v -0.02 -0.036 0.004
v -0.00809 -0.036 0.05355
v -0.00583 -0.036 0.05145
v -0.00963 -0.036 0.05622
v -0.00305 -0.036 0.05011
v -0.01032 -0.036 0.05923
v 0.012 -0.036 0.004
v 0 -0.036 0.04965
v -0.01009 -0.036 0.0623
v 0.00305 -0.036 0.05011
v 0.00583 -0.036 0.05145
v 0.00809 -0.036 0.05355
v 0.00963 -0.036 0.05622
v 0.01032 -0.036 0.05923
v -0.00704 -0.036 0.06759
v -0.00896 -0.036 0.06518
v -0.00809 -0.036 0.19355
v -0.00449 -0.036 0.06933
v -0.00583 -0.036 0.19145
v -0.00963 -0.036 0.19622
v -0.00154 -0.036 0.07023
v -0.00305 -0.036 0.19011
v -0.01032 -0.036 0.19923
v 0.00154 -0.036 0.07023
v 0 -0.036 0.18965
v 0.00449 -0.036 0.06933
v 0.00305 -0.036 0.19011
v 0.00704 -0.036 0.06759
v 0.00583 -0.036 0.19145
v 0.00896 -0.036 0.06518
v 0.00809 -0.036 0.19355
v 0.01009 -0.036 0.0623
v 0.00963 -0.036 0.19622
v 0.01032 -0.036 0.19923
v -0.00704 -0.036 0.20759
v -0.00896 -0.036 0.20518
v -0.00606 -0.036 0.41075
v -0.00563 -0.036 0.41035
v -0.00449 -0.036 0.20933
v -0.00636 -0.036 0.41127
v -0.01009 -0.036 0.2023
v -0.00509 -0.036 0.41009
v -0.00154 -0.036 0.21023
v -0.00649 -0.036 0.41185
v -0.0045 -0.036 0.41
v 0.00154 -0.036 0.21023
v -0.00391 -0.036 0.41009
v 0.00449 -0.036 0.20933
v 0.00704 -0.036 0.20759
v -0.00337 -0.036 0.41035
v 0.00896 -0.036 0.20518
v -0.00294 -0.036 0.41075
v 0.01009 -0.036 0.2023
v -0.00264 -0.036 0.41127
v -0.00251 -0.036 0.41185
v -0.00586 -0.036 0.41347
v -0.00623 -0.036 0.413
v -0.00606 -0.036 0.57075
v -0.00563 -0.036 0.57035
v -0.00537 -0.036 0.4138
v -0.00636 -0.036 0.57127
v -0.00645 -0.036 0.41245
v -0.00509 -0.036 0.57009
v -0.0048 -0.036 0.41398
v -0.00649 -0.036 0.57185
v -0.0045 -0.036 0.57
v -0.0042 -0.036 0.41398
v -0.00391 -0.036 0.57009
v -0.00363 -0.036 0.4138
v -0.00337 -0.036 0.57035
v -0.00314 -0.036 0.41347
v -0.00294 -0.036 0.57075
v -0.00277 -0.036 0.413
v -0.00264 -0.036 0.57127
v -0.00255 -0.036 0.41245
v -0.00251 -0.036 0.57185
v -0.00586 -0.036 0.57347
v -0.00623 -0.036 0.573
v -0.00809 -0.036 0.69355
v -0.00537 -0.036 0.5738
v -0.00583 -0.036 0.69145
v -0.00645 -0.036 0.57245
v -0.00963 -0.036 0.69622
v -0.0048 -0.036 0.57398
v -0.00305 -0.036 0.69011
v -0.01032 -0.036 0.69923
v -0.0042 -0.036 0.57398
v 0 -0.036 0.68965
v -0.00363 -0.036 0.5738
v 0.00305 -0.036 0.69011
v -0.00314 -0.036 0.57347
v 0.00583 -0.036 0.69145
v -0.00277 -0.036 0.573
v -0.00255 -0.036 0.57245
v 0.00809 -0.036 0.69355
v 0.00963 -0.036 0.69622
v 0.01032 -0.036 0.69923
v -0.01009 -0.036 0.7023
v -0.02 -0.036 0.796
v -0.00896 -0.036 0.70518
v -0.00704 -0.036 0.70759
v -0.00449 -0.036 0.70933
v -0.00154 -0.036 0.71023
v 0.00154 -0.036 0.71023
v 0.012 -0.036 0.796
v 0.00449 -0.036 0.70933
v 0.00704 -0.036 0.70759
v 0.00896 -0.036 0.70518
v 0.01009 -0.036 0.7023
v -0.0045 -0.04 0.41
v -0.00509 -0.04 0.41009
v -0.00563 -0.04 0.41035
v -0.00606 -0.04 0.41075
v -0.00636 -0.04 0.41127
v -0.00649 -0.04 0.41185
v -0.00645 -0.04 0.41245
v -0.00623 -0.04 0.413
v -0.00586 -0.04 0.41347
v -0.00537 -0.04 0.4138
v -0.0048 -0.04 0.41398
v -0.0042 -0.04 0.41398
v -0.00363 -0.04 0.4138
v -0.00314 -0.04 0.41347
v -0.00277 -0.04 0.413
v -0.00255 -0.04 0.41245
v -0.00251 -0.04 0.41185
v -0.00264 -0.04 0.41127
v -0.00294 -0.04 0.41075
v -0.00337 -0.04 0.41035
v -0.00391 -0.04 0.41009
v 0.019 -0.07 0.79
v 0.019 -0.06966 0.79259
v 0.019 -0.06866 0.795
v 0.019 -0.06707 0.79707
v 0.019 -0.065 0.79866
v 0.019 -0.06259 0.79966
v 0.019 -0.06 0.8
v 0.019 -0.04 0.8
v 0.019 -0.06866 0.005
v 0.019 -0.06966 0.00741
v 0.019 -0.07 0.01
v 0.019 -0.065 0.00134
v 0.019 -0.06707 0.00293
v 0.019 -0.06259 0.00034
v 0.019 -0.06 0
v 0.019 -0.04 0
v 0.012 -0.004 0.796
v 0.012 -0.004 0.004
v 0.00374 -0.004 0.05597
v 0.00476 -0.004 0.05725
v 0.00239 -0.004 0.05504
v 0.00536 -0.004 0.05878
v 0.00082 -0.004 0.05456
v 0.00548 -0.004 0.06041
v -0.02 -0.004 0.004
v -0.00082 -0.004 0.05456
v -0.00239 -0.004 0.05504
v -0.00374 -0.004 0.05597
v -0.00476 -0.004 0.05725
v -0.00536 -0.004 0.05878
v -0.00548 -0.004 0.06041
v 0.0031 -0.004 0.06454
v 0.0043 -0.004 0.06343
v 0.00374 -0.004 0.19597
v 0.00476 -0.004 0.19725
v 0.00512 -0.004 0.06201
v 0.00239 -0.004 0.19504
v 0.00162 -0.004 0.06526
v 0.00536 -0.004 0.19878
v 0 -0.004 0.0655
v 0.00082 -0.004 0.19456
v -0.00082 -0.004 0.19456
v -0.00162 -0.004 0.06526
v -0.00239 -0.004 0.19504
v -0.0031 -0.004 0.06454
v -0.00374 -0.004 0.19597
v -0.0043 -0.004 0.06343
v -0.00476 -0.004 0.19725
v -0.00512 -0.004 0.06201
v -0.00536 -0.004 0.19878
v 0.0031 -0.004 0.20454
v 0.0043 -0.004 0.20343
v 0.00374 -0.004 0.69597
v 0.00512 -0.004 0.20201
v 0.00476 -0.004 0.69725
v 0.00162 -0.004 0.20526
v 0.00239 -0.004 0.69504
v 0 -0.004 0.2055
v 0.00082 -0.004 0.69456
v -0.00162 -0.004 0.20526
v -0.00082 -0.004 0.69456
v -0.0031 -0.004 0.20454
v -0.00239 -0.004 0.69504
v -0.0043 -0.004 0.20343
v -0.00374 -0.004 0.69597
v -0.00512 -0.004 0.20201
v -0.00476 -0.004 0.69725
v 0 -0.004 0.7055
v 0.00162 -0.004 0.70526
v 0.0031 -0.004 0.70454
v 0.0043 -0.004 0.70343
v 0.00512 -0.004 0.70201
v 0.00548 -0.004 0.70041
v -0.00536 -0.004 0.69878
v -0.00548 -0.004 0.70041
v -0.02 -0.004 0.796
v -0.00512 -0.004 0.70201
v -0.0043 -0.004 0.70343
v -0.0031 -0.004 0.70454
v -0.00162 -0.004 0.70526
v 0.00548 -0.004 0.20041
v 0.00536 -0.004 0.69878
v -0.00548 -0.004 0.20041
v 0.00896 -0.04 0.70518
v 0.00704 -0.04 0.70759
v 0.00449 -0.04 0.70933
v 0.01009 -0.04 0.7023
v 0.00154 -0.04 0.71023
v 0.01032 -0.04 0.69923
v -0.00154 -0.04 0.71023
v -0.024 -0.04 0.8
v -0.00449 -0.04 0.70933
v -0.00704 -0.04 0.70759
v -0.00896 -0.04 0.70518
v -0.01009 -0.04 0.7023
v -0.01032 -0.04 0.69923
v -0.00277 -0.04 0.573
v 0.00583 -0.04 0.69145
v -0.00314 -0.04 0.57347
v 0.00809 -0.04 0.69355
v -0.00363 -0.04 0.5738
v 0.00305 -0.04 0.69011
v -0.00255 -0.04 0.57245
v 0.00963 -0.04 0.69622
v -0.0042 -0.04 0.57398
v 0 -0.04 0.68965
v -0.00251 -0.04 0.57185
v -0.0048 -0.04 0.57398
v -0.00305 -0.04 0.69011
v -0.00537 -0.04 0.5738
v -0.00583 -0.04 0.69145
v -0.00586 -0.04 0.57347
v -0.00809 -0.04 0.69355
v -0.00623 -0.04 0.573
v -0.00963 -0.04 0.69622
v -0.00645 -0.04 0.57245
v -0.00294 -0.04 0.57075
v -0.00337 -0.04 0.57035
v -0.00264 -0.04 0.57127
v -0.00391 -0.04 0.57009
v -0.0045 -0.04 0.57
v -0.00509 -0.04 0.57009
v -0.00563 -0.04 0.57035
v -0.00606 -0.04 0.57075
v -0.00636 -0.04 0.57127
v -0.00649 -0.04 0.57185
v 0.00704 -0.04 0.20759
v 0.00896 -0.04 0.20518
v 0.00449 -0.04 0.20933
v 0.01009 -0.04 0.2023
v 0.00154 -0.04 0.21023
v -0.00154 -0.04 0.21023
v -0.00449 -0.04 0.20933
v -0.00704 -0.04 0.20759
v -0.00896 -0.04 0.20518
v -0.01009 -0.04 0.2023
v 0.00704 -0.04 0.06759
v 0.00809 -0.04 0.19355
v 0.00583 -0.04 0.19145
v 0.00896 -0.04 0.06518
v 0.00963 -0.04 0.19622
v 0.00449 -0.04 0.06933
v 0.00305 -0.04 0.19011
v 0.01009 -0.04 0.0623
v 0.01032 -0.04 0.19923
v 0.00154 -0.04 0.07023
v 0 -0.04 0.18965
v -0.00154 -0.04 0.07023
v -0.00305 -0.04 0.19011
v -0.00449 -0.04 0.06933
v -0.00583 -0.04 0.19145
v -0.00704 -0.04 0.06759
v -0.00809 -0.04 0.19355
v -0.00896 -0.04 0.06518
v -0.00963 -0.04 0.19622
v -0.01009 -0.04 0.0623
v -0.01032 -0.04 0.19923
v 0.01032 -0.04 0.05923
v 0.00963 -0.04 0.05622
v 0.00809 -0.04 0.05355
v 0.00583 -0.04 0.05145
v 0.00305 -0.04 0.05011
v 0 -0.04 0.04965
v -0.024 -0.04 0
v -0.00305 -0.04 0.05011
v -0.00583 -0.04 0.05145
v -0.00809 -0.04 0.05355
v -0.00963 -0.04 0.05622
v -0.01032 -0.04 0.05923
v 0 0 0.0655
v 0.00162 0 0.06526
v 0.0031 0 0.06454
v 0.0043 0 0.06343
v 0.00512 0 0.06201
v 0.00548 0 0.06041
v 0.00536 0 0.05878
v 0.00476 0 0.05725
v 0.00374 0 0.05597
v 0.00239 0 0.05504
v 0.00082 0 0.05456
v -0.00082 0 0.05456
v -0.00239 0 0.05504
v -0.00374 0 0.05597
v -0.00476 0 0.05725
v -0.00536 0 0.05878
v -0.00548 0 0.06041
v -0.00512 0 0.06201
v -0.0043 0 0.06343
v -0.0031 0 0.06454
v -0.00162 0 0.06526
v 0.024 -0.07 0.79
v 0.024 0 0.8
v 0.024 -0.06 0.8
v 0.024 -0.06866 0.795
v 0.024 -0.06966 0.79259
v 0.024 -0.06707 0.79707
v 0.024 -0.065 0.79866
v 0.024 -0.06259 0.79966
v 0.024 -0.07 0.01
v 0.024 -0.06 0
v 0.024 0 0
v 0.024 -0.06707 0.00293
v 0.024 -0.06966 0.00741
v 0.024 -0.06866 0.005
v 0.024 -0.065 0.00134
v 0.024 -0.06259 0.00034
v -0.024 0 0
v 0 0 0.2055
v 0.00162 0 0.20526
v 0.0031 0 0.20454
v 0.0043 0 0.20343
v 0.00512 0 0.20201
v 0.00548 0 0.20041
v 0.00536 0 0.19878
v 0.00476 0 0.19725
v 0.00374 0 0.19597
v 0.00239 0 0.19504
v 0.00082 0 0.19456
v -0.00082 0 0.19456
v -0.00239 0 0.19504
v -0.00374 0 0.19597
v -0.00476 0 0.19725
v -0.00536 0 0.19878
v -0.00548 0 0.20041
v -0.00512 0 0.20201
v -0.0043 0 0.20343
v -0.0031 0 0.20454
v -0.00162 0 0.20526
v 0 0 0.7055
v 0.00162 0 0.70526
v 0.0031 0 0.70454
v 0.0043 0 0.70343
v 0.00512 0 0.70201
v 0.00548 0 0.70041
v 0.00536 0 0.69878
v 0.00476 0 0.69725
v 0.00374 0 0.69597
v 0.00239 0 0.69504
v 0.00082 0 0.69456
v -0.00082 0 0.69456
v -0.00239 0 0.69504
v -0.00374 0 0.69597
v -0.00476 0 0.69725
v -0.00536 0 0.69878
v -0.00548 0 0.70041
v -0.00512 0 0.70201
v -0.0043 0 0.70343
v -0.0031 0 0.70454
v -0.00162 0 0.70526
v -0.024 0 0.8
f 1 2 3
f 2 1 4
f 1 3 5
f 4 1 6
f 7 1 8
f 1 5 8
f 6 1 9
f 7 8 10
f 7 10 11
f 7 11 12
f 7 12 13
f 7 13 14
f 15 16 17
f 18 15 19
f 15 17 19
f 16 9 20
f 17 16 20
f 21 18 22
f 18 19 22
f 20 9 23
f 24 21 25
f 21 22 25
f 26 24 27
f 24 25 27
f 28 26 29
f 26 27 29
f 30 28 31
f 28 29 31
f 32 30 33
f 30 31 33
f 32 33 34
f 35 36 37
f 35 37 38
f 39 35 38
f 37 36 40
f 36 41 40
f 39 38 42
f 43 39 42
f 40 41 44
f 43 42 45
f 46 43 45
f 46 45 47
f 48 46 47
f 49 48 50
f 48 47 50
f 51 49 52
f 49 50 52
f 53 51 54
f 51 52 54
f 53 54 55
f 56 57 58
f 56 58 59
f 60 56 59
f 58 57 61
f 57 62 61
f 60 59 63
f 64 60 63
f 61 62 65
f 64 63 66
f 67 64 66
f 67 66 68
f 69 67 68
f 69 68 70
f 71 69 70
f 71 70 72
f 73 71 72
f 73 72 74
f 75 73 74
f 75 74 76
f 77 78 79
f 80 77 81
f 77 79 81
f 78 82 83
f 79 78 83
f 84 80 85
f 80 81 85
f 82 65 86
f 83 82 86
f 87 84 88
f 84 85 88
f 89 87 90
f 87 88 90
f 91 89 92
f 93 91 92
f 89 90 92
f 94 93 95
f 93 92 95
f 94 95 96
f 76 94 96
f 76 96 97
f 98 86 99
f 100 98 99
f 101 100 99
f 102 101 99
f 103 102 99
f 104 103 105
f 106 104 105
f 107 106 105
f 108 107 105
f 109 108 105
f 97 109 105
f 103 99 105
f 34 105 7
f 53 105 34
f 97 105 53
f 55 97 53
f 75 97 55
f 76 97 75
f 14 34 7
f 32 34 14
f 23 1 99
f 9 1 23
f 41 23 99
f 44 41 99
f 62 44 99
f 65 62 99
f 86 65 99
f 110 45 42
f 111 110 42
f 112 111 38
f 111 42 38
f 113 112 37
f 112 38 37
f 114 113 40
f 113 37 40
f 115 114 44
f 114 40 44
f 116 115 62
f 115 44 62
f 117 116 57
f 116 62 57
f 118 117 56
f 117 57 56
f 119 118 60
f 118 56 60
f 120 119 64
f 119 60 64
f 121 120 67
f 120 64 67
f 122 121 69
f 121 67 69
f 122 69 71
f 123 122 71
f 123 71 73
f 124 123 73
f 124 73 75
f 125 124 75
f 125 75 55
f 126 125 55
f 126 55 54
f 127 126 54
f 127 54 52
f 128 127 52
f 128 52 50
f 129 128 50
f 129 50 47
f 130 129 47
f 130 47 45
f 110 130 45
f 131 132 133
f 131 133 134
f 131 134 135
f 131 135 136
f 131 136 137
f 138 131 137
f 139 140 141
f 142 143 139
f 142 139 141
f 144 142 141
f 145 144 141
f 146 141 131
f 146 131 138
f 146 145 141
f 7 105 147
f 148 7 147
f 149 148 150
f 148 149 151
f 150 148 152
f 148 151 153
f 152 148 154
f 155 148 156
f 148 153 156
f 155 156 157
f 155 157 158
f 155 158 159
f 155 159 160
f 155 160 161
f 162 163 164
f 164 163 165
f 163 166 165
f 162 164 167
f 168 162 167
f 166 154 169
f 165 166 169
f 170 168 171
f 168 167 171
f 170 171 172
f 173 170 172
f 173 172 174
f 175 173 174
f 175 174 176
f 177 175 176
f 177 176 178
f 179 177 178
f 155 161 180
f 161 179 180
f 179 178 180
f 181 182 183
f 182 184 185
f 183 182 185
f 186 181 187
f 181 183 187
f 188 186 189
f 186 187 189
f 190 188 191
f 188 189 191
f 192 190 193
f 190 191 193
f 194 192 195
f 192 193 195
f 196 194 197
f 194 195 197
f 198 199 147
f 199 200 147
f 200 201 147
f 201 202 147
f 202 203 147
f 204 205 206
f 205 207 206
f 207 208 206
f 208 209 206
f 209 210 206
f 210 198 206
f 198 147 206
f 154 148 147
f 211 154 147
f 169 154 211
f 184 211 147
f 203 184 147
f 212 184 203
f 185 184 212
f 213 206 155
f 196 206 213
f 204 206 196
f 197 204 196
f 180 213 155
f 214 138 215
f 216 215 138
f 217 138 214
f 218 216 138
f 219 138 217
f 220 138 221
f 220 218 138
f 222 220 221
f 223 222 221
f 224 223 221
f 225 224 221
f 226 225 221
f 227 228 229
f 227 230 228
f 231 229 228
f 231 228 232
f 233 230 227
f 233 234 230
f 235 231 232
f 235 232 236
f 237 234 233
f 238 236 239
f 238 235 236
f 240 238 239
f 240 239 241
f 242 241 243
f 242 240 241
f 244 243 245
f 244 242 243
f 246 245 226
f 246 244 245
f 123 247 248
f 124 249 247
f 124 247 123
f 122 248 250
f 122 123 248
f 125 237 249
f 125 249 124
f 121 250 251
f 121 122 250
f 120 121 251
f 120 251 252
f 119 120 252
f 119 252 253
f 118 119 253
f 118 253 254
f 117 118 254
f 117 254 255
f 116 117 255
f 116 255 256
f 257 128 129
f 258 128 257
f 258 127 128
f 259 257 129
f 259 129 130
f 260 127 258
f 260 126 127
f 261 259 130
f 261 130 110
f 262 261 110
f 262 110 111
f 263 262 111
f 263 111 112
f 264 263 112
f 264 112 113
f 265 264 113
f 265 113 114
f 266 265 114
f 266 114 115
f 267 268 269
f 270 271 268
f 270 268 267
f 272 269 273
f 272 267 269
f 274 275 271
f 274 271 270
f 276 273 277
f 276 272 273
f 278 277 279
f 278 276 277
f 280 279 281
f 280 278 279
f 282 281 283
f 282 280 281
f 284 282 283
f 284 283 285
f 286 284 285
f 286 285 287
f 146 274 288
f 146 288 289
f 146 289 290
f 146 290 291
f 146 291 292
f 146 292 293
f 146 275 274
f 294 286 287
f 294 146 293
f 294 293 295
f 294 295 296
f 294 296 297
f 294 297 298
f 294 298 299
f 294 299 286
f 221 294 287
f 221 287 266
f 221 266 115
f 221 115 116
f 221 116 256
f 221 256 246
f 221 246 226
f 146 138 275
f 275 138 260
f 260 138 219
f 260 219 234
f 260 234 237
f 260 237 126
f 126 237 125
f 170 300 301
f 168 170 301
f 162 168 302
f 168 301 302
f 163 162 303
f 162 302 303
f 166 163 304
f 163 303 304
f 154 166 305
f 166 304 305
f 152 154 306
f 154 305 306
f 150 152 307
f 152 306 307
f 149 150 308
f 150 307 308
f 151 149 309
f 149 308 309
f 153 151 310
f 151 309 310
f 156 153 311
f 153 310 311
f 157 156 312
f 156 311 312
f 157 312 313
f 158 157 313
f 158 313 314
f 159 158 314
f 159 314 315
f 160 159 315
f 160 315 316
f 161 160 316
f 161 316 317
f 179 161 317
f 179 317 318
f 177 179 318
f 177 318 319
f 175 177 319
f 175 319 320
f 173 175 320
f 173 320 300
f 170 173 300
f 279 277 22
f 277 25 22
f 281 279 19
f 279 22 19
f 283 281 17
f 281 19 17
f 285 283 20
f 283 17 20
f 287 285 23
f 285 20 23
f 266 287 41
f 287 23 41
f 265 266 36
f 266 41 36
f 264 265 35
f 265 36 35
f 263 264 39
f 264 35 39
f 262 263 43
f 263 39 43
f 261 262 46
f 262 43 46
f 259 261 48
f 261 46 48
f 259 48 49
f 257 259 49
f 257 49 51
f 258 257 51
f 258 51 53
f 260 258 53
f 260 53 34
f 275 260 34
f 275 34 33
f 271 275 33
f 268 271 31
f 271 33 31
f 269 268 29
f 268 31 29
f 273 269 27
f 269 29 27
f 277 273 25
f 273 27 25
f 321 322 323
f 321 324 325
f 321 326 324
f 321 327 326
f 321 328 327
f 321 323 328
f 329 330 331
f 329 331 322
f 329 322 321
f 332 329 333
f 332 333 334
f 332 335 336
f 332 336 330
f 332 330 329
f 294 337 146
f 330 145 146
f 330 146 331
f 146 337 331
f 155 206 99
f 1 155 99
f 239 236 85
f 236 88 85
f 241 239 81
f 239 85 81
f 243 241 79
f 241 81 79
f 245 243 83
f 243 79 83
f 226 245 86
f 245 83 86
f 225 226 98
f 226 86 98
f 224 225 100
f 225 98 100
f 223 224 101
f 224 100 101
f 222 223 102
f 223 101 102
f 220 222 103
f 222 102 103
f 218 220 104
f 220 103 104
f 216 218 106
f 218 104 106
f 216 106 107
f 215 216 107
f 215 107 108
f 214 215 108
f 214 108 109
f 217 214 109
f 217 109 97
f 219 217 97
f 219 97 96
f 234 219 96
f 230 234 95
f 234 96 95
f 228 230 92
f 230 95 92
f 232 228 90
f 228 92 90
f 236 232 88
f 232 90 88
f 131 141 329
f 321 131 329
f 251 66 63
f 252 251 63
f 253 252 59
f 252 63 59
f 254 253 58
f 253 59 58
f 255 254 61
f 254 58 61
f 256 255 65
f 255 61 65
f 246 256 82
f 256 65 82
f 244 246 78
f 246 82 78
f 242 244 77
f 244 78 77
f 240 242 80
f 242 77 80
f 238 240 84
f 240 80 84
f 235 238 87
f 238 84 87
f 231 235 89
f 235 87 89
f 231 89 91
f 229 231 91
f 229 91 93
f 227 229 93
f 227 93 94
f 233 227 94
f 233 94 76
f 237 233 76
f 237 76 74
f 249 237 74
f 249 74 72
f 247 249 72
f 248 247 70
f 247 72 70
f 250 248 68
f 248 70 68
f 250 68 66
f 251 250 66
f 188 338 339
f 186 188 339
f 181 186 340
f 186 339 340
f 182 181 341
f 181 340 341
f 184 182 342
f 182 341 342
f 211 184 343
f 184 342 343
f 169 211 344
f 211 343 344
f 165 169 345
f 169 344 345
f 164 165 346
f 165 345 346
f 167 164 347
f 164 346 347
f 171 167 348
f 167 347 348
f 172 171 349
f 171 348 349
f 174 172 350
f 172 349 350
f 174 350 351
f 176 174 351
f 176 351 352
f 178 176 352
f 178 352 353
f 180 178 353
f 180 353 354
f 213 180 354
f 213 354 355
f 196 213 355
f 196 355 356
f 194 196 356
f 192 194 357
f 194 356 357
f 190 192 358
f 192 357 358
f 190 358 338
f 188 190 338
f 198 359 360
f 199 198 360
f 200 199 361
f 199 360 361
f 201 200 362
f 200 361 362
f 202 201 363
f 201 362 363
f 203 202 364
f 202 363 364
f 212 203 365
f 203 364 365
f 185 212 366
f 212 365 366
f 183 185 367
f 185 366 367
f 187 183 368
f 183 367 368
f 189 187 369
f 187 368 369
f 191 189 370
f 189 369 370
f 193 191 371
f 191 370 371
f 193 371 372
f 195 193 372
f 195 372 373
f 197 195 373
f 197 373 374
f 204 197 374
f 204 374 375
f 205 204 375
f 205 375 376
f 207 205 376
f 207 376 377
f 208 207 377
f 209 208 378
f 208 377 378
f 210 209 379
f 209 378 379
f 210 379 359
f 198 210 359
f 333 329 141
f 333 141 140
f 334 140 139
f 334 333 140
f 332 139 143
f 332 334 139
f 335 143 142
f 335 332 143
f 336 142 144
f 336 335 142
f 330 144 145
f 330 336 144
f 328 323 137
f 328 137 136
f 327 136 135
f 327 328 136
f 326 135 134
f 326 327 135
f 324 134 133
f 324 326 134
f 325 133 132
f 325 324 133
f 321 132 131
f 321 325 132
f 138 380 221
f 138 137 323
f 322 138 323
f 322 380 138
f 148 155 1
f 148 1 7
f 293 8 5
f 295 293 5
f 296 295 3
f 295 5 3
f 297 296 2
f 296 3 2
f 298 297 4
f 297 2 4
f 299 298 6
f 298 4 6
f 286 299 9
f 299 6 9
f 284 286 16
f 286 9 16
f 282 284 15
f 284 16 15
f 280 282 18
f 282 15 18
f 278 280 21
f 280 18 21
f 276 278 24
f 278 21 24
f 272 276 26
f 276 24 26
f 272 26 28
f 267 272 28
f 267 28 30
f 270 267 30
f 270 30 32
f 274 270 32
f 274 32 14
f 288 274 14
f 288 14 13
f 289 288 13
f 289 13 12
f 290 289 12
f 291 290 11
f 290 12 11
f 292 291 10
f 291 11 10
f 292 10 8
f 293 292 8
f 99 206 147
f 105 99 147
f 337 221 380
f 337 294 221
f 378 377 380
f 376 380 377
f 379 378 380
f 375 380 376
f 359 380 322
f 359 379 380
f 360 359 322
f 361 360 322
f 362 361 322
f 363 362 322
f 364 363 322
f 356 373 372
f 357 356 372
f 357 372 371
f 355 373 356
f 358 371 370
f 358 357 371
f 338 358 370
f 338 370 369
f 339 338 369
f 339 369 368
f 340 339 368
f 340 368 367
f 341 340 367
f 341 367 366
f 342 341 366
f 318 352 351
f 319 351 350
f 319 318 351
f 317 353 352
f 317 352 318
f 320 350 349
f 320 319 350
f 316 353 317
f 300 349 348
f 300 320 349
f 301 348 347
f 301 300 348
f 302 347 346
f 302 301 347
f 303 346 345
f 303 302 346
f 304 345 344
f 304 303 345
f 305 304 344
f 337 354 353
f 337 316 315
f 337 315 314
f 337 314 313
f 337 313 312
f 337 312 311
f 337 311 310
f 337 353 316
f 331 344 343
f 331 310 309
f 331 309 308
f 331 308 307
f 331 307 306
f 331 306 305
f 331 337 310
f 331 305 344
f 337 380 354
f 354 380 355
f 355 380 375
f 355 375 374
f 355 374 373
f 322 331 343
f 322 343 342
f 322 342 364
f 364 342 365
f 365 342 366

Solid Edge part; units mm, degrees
sketch "Sketch1" plane through (0, 0, 0) normal (0, 0, 1) x (1, 0, 0)
  line L0 (0.019, -0.07) -> (0.024, -0.07)
  line L1 (0.024, 0) -> (0.024, -0.07)
  line L2 (-0.024, 0) -> (0.024, 0)
  line L3 (-0.024, -0.04) -> (-0.024, 0)
  line L4 (0.019, -0.04) -> (-0.024, -0.04)
  line L5 (0.019, -0.07) -> (0.019, -0.04)
  dimension "D1" = 0.005
  dimension "D2" = 0.07
  dimension "D3" = 0.048
  dimension "D4" = 0.04
extrude "Protrusion1" add sketch "Sketch1" along normal blind 0.8
sketch "Sketch2" plane through (0, -0.03, 0.8) normal (0, 0, 1) x (1, 0, 0)
  line L0 (-0.02, -0.006) -> (0.012, -0.006)
  line L1 (0.012, -0.006) -> (0.012, 0.026)
  line L2 (0.012, 0.026) -> (-0.02, 0.026)
  line L3 (-0.02, 0.026) -> (-0.02, -0.006)
  dimension "D1" = 0.004
  dimension "D2" = 0.032
extrude "Cutout1" cut sketch "Sketch2" against normal through all
sketch "Sketch3" plane through (0, -0.03, 0.8) normal (0, 0, 1) x (1, 0, 0)
  line L0 (-0.02, 0.026) -> (-0.02, -0.006)
  line L1 (-0.02, -0.006) -> (0.012, -0.006)
  line L2 (0.012, -0.006) -> (0.012, 0.026)
  line L3 (0.012, 0.026) -> (-0.02, 0.026)
extrude "Ausprägung_5" add sketch "Sketch3" against normal blind 0.004
sketch "Sketch4" plane through (0, -0.03, 0) normal (0, 0, -1) x (1, 0, 0)
  line L0 (-0.02, 0.006) -> (0.012, 0.006)
  line L1 (0.012, 0.006) -> (0.012, -0.026)
  line L2 (0.012, -0.026) -> (-0.02, -0.026)
  line L3 (-0.02, -0.026) -> (-0.02, 0.006)
extrude "Ausprägung_6" add sketch "Sketch4" against normal blind 0.004
fillet "Verrundung_1" radius 0.01 2 edges at (0.0215, -0.07, 0.8) (0.0215, -0.07, 0)
hole "Hole1" at (0, 0, 0.2) direction (0, -1, 0) diameter 0.011 end through all
hole "Hole2" at (0, 0, 0.7) direction (0, -1, 0) diameter 0.011 end through all
hole "Hole3" at (0, 0, 0.06) direction (0, -1, 0) diameter 0.011 end through all
hole "Bohrung_17" at (0, -0.04, 0.7) direction (0, 1, 0) diameter 0.0207 depth 0.005
hole "Hole4" at (0, -0.04, 0.2) direction (0, 1, 0) diameter 0.0207 depth 0.005
hole "Hole5" at (0, -0.04, 0.06) direction (0, 1, 0) diameter 0.0207 depth 0.005
hole "Hole6" at (-0.0045, -0.04, 0.412) direction (0, 1, 0) diameter 0.004 depth 0.02
hole "Hole7" at (-0.0045, -0.04, 0.572) direction (0, 1, 0) diameter 0.004 depth 0.02
